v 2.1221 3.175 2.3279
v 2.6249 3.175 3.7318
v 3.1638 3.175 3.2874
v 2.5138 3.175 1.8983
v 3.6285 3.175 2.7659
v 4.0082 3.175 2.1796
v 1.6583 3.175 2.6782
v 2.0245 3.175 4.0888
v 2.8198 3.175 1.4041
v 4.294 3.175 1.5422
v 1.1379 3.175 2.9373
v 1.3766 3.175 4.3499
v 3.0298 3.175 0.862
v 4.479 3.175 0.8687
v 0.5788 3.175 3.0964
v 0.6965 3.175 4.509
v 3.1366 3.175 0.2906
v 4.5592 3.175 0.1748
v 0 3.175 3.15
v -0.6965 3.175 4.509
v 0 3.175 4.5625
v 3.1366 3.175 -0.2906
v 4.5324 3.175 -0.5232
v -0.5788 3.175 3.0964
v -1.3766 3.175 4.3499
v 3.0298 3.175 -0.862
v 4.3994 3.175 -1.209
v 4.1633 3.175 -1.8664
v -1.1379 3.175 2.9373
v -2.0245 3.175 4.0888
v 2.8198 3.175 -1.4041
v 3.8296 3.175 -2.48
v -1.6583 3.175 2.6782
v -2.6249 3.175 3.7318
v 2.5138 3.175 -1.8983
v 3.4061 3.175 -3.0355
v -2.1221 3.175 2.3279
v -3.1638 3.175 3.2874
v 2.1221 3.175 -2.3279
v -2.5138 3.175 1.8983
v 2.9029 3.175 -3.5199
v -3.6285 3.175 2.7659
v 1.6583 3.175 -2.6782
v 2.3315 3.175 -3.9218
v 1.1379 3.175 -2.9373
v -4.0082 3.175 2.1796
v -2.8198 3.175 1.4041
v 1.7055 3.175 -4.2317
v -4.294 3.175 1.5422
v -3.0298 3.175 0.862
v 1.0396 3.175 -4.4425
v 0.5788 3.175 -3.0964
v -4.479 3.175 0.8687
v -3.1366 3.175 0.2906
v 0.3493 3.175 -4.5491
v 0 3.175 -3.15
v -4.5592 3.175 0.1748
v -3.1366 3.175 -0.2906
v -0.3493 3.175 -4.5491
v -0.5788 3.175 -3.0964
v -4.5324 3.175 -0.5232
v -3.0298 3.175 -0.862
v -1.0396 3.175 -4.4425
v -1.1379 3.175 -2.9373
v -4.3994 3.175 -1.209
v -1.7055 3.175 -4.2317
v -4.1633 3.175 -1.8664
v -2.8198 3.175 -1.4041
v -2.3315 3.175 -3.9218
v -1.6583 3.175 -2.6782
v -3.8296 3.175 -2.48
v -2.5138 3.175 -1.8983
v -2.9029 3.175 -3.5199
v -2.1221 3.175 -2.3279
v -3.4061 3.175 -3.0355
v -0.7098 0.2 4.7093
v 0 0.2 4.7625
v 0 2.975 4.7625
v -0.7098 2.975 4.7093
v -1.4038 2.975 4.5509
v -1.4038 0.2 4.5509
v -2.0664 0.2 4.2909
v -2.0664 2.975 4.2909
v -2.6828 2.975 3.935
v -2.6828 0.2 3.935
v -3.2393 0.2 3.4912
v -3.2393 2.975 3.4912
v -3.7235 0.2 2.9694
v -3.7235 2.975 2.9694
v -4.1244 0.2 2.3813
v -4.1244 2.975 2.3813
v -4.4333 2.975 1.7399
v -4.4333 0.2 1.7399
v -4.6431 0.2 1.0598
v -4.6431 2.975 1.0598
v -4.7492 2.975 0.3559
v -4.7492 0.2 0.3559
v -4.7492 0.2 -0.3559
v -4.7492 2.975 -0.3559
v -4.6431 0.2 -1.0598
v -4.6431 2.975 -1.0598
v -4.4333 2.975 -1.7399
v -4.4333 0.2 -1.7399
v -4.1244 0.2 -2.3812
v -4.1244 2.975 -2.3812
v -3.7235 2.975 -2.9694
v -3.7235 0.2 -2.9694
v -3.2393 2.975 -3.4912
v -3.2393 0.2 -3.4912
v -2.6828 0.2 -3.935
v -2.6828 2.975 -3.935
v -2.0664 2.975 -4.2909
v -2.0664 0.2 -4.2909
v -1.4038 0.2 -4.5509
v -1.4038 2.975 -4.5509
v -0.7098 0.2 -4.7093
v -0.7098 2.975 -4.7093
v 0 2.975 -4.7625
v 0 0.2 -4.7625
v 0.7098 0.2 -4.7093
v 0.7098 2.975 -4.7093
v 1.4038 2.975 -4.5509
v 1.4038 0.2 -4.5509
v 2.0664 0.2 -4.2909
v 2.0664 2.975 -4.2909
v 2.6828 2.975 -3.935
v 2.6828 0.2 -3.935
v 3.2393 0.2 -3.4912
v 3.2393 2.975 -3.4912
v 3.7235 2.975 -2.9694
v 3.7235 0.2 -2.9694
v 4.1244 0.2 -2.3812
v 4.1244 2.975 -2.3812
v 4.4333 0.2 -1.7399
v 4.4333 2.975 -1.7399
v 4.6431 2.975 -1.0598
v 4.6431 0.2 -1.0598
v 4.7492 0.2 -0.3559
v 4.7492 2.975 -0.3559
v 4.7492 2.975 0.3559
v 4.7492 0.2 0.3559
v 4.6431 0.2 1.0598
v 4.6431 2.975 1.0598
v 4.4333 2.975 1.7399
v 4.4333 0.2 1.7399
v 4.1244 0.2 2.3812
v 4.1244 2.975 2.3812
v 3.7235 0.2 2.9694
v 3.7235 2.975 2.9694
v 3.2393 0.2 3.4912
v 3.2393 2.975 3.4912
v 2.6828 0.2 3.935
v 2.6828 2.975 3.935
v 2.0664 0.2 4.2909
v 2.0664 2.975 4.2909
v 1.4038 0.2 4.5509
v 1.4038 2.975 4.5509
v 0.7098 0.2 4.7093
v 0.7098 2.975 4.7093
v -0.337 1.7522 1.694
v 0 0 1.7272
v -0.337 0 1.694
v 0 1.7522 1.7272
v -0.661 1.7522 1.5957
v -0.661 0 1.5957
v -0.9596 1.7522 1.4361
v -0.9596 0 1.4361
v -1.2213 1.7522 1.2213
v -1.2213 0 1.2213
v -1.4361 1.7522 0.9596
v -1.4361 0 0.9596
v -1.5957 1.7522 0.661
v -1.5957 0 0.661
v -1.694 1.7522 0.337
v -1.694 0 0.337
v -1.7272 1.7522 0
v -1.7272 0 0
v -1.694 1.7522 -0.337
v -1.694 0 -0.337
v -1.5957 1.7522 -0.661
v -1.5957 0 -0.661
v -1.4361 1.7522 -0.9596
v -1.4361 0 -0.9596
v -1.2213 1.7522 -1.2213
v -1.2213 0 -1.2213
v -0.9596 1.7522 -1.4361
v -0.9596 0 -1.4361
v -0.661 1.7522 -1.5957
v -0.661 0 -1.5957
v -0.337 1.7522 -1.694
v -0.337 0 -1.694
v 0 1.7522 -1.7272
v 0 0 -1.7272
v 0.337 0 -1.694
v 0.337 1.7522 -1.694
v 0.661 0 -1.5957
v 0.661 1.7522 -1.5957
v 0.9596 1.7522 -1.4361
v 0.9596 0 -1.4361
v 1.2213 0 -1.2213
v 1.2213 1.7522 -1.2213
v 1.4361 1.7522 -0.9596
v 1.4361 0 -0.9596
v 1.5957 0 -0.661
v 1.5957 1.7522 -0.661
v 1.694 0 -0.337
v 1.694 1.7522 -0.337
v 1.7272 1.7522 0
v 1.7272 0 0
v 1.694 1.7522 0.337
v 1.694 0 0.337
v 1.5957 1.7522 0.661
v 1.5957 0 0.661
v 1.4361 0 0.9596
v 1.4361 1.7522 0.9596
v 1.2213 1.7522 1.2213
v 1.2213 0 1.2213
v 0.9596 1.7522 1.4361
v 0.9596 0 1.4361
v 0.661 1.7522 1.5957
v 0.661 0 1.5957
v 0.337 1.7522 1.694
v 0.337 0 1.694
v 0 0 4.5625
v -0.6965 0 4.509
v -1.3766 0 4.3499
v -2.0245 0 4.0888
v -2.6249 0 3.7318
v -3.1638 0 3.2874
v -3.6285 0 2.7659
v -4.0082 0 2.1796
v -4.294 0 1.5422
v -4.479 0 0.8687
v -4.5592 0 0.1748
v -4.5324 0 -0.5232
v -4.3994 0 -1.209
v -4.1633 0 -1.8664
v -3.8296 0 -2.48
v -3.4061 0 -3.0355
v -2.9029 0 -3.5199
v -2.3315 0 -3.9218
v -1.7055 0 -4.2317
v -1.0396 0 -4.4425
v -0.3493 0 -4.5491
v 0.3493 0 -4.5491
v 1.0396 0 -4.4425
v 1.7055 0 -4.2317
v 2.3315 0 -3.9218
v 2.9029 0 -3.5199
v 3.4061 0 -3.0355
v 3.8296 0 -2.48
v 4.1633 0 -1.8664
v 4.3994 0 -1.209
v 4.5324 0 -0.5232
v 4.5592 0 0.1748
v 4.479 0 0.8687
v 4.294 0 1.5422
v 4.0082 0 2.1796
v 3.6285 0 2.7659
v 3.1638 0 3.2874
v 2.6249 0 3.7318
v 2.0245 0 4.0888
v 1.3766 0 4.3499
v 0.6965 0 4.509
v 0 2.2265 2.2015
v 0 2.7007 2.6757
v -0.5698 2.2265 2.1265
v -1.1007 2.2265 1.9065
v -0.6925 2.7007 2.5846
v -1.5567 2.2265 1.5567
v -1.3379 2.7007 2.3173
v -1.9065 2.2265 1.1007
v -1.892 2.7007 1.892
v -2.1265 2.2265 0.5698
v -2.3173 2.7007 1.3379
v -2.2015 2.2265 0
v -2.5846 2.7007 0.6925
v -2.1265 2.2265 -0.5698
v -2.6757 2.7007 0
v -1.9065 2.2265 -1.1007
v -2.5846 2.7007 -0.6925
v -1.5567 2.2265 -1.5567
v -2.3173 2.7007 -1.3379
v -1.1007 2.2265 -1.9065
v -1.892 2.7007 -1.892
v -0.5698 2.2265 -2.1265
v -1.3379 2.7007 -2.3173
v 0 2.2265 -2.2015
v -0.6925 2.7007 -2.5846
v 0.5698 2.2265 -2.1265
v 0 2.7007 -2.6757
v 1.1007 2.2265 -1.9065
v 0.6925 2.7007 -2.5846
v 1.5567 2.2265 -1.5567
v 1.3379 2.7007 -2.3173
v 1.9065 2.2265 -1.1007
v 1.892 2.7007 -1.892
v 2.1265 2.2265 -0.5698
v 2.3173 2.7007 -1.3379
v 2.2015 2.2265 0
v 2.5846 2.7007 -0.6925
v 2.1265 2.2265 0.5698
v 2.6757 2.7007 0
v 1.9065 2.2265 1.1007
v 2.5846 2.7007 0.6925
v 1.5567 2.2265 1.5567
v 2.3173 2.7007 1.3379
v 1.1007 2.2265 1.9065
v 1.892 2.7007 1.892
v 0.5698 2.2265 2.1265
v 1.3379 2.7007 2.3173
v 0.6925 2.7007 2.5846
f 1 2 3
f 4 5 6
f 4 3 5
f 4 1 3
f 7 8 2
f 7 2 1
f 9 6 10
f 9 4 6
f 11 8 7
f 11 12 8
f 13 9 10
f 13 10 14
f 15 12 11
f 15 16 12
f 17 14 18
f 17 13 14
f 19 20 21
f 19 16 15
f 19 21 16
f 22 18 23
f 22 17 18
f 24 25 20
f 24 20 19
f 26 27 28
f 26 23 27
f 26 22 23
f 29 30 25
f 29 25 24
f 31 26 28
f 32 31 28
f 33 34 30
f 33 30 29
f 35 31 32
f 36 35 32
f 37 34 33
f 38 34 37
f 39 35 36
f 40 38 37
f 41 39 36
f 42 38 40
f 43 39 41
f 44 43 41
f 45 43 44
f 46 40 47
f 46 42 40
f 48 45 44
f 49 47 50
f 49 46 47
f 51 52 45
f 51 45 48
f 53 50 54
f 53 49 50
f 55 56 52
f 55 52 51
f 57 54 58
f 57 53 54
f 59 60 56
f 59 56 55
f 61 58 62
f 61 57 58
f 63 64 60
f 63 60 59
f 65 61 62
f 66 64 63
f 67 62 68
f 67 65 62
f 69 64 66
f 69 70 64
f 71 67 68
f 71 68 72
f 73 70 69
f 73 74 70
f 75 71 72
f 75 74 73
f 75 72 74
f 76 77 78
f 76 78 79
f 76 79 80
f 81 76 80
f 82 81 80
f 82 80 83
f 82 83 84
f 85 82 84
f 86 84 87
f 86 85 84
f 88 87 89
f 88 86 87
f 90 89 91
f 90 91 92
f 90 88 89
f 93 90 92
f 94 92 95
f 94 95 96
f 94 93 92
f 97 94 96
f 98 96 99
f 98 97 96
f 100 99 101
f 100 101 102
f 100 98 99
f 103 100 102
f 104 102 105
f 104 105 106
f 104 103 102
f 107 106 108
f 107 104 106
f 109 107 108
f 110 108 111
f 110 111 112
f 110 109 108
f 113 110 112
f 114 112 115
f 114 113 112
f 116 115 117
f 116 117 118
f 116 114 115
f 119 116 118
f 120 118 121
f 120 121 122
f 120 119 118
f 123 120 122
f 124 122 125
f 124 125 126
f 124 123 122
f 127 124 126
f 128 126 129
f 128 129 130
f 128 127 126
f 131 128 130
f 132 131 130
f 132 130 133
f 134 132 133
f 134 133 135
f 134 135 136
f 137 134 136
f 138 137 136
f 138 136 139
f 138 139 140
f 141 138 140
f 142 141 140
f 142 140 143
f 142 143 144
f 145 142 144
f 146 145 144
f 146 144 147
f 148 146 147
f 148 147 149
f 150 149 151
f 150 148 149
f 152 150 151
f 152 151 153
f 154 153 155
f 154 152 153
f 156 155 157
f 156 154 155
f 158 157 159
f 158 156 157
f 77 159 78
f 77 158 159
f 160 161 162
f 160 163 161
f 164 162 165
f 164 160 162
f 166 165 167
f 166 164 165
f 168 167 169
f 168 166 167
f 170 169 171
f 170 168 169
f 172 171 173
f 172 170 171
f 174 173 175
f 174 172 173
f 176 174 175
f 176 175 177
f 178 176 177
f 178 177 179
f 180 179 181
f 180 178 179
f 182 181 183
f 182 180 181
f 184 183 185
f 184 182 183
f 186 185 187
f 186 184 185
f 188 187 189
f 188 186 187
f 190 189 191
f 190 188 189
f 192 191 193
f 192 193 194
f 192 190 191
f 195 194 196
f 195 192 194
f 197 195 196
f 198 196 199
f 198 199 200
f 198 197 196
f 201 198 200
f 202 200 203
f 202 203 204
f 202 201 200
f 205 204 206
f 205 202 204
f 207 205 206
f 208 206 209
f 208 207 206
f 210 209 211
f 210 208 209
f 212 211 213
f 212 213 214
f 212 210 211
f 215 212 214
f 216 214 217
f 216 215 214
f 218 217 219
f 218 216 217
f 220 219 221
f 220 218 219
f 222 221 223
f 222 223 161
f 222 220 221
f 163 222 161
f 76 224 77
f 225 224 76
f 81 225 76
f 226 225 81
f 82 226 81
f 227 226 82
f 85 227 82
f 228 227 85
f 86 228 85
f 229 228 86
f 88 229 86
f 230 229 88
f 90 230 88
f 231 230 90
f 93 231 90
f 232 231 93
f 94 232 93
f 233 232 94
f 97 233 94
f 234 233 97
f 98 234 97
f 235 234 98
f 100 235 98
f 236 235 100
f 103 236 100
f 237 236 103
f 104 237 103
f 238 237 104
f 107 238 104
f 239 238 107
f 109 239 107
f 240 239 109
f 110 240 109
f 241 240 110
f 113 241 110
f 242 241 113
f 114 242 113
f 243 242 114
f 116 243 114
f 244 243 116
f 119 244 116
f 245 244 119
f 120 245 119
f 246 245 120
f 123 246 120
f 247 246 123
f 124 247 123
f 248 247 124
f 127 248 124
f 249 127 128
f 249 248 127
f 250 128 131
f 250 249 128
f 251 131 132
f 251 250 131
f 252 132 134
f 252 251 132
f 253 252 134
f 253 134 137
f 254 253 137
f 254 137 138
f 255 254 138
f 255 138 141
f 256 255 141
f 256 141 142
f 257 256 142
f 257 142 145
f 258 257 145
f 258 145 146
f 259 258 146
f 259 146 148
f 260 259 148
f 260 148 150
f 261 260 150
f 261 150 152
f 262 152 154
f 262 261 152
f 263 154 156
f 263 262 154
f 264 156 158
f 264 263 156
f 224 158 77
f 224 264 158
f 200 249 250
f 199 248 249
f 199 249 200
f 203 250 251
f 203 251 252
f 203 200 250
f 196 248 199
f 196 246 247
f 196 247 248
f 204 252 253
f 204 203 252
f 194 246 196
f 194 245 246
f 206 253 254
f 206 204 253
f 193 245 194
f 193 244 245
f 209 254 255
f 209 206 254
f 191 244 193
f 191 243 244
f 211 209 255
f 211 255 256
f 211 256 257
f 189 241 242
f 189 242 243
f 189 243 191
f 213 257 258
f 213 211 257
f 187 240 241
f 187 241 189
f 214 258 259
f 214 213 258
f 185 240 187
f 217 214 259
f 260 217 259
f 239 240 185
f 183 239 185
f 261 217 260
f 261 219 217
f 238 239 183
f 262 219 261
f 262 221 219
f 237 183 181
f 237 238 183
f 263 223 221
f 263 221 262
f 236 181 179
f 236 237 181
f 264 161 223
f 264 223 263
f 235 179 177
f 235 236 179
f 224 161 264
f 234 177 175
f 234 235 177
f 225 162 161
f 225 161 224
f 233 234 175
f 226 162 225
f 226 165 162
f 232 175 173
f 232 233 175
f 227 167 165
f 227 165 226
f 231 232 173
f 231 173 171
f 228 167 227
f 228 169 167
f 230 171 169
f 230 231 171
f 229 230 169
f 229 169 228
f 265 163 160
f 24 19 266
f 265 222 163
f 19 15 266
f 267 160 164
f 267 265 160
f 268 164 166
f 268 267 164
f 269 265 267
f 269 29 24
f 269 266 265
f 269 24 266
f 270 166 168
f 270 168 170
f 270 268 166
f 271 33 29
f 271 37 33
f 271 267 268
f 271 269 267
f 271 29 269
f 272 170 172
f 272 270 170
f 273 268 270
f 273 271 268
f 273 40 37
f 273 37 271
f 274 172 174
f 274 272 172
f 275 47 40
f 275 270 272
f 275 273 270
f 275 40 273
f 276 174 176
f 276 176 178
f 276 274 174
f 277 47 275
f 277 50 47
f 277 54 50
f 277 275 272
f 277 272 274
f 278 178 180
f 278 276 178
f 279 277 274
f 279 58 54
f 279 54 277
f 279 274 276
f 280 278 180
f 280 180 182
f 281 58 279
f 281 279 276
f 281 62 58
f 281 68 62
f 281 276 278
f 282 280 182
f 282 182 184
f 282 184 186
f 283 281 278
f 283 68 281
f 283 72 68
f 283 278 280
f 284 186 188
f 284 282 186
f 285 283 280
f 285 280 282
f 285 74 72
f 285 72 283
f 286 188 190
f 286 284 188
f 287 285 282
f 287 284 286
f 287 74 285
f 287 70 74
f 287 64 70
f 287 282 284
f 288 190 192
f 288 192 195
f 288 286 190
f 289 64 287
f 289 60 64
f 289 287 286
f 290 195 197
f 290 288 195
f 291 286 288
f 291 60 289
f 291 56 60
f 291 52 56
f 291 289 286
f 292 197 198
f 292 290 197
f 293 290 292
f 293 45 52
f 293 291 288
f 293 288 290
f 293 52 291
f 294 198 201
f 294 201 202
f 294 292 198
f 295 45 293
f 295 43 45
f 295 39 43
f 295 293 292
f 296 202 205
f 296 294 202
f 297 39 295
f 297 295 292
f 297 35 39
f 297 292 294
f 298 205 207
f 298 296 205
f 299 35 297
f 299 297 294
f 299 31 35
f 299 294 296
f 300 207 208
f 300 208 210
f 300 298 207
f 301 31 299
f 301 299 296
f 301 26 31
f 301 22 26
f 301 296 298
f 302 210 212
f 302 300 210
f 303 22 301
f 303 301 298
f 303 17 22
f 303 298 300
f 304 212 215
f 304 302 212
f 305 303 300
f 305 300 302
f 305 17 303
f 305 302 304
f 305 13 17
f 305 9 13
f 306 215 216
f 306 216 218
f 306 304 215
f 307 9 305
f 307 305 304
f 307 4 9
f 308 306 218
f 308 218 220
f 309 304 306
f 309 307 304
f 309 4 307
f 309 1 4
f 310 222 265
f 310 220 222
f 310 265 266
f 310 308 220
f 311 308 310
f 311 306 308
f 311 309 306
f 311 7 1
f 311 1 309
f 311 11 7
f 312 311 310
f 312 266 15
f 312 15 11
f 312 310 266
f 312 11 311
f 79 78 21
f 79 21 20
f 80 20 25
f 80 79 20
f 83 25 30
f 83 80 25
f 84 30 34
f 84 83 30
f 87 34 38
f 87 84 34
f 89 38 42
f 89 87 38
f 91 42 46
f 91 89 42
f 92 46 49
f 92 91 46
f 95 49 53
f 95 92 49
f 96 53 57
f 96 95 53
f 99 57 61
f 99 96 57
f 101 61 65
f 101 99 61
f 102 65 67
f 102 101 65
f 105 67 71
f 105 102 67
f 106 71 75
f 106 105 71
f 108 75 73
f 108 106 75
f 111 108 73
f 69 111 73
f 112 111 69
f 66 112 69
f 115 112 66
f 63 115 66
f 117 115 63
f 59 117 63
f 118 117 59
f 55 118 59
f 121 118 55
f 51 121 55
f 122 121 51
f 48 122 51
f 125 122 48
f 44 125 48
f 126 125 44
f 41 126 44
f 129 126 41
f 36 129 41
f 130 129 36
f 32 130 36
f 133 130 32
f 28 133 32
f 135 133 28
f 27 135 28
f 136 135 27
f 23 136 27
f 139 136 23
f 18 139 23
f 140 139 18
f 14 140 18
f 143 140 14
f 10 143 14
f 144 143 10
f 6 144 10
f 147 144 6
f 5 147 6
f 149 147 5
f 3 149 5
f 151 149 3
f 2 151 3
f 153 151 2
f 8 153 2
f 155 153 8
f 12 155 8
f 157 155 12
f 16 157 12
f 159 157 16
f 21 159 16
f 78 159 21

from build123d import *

# Parameters (mm, degrees)
CHAMFER1_SIZE = 0.2


with BuildPart() as part:
    # Sketch1 → Revolve1 (revolve)
    with BuildSketch(Plane.XY, mode=Mode.PRIVATE) as revolve1_sk:
        Polygon((-1.7272, 0), (-1.7272, 1.7522), (-3.15, 3.175), (-4.7625, 3.175), (-4.7625, 0), align=None)
    revolve(revolve1_sk.sketch.rotate(Axis((0, 0, 0), (0, -1, 0)), 270), axis=Axis((0, 0, 0), (0, -1, 0)))

    # Chamfer1
    chamfer1_edges = [part.edges().sort_by_distance(p)[0] for p in [
        (0, 0, -4.7625),
        (0, 3.175, -4.7625),
    ]]
    chamfer(chamfer1_edges, length=CHAMFER1_SIZE)


solid = part.part
